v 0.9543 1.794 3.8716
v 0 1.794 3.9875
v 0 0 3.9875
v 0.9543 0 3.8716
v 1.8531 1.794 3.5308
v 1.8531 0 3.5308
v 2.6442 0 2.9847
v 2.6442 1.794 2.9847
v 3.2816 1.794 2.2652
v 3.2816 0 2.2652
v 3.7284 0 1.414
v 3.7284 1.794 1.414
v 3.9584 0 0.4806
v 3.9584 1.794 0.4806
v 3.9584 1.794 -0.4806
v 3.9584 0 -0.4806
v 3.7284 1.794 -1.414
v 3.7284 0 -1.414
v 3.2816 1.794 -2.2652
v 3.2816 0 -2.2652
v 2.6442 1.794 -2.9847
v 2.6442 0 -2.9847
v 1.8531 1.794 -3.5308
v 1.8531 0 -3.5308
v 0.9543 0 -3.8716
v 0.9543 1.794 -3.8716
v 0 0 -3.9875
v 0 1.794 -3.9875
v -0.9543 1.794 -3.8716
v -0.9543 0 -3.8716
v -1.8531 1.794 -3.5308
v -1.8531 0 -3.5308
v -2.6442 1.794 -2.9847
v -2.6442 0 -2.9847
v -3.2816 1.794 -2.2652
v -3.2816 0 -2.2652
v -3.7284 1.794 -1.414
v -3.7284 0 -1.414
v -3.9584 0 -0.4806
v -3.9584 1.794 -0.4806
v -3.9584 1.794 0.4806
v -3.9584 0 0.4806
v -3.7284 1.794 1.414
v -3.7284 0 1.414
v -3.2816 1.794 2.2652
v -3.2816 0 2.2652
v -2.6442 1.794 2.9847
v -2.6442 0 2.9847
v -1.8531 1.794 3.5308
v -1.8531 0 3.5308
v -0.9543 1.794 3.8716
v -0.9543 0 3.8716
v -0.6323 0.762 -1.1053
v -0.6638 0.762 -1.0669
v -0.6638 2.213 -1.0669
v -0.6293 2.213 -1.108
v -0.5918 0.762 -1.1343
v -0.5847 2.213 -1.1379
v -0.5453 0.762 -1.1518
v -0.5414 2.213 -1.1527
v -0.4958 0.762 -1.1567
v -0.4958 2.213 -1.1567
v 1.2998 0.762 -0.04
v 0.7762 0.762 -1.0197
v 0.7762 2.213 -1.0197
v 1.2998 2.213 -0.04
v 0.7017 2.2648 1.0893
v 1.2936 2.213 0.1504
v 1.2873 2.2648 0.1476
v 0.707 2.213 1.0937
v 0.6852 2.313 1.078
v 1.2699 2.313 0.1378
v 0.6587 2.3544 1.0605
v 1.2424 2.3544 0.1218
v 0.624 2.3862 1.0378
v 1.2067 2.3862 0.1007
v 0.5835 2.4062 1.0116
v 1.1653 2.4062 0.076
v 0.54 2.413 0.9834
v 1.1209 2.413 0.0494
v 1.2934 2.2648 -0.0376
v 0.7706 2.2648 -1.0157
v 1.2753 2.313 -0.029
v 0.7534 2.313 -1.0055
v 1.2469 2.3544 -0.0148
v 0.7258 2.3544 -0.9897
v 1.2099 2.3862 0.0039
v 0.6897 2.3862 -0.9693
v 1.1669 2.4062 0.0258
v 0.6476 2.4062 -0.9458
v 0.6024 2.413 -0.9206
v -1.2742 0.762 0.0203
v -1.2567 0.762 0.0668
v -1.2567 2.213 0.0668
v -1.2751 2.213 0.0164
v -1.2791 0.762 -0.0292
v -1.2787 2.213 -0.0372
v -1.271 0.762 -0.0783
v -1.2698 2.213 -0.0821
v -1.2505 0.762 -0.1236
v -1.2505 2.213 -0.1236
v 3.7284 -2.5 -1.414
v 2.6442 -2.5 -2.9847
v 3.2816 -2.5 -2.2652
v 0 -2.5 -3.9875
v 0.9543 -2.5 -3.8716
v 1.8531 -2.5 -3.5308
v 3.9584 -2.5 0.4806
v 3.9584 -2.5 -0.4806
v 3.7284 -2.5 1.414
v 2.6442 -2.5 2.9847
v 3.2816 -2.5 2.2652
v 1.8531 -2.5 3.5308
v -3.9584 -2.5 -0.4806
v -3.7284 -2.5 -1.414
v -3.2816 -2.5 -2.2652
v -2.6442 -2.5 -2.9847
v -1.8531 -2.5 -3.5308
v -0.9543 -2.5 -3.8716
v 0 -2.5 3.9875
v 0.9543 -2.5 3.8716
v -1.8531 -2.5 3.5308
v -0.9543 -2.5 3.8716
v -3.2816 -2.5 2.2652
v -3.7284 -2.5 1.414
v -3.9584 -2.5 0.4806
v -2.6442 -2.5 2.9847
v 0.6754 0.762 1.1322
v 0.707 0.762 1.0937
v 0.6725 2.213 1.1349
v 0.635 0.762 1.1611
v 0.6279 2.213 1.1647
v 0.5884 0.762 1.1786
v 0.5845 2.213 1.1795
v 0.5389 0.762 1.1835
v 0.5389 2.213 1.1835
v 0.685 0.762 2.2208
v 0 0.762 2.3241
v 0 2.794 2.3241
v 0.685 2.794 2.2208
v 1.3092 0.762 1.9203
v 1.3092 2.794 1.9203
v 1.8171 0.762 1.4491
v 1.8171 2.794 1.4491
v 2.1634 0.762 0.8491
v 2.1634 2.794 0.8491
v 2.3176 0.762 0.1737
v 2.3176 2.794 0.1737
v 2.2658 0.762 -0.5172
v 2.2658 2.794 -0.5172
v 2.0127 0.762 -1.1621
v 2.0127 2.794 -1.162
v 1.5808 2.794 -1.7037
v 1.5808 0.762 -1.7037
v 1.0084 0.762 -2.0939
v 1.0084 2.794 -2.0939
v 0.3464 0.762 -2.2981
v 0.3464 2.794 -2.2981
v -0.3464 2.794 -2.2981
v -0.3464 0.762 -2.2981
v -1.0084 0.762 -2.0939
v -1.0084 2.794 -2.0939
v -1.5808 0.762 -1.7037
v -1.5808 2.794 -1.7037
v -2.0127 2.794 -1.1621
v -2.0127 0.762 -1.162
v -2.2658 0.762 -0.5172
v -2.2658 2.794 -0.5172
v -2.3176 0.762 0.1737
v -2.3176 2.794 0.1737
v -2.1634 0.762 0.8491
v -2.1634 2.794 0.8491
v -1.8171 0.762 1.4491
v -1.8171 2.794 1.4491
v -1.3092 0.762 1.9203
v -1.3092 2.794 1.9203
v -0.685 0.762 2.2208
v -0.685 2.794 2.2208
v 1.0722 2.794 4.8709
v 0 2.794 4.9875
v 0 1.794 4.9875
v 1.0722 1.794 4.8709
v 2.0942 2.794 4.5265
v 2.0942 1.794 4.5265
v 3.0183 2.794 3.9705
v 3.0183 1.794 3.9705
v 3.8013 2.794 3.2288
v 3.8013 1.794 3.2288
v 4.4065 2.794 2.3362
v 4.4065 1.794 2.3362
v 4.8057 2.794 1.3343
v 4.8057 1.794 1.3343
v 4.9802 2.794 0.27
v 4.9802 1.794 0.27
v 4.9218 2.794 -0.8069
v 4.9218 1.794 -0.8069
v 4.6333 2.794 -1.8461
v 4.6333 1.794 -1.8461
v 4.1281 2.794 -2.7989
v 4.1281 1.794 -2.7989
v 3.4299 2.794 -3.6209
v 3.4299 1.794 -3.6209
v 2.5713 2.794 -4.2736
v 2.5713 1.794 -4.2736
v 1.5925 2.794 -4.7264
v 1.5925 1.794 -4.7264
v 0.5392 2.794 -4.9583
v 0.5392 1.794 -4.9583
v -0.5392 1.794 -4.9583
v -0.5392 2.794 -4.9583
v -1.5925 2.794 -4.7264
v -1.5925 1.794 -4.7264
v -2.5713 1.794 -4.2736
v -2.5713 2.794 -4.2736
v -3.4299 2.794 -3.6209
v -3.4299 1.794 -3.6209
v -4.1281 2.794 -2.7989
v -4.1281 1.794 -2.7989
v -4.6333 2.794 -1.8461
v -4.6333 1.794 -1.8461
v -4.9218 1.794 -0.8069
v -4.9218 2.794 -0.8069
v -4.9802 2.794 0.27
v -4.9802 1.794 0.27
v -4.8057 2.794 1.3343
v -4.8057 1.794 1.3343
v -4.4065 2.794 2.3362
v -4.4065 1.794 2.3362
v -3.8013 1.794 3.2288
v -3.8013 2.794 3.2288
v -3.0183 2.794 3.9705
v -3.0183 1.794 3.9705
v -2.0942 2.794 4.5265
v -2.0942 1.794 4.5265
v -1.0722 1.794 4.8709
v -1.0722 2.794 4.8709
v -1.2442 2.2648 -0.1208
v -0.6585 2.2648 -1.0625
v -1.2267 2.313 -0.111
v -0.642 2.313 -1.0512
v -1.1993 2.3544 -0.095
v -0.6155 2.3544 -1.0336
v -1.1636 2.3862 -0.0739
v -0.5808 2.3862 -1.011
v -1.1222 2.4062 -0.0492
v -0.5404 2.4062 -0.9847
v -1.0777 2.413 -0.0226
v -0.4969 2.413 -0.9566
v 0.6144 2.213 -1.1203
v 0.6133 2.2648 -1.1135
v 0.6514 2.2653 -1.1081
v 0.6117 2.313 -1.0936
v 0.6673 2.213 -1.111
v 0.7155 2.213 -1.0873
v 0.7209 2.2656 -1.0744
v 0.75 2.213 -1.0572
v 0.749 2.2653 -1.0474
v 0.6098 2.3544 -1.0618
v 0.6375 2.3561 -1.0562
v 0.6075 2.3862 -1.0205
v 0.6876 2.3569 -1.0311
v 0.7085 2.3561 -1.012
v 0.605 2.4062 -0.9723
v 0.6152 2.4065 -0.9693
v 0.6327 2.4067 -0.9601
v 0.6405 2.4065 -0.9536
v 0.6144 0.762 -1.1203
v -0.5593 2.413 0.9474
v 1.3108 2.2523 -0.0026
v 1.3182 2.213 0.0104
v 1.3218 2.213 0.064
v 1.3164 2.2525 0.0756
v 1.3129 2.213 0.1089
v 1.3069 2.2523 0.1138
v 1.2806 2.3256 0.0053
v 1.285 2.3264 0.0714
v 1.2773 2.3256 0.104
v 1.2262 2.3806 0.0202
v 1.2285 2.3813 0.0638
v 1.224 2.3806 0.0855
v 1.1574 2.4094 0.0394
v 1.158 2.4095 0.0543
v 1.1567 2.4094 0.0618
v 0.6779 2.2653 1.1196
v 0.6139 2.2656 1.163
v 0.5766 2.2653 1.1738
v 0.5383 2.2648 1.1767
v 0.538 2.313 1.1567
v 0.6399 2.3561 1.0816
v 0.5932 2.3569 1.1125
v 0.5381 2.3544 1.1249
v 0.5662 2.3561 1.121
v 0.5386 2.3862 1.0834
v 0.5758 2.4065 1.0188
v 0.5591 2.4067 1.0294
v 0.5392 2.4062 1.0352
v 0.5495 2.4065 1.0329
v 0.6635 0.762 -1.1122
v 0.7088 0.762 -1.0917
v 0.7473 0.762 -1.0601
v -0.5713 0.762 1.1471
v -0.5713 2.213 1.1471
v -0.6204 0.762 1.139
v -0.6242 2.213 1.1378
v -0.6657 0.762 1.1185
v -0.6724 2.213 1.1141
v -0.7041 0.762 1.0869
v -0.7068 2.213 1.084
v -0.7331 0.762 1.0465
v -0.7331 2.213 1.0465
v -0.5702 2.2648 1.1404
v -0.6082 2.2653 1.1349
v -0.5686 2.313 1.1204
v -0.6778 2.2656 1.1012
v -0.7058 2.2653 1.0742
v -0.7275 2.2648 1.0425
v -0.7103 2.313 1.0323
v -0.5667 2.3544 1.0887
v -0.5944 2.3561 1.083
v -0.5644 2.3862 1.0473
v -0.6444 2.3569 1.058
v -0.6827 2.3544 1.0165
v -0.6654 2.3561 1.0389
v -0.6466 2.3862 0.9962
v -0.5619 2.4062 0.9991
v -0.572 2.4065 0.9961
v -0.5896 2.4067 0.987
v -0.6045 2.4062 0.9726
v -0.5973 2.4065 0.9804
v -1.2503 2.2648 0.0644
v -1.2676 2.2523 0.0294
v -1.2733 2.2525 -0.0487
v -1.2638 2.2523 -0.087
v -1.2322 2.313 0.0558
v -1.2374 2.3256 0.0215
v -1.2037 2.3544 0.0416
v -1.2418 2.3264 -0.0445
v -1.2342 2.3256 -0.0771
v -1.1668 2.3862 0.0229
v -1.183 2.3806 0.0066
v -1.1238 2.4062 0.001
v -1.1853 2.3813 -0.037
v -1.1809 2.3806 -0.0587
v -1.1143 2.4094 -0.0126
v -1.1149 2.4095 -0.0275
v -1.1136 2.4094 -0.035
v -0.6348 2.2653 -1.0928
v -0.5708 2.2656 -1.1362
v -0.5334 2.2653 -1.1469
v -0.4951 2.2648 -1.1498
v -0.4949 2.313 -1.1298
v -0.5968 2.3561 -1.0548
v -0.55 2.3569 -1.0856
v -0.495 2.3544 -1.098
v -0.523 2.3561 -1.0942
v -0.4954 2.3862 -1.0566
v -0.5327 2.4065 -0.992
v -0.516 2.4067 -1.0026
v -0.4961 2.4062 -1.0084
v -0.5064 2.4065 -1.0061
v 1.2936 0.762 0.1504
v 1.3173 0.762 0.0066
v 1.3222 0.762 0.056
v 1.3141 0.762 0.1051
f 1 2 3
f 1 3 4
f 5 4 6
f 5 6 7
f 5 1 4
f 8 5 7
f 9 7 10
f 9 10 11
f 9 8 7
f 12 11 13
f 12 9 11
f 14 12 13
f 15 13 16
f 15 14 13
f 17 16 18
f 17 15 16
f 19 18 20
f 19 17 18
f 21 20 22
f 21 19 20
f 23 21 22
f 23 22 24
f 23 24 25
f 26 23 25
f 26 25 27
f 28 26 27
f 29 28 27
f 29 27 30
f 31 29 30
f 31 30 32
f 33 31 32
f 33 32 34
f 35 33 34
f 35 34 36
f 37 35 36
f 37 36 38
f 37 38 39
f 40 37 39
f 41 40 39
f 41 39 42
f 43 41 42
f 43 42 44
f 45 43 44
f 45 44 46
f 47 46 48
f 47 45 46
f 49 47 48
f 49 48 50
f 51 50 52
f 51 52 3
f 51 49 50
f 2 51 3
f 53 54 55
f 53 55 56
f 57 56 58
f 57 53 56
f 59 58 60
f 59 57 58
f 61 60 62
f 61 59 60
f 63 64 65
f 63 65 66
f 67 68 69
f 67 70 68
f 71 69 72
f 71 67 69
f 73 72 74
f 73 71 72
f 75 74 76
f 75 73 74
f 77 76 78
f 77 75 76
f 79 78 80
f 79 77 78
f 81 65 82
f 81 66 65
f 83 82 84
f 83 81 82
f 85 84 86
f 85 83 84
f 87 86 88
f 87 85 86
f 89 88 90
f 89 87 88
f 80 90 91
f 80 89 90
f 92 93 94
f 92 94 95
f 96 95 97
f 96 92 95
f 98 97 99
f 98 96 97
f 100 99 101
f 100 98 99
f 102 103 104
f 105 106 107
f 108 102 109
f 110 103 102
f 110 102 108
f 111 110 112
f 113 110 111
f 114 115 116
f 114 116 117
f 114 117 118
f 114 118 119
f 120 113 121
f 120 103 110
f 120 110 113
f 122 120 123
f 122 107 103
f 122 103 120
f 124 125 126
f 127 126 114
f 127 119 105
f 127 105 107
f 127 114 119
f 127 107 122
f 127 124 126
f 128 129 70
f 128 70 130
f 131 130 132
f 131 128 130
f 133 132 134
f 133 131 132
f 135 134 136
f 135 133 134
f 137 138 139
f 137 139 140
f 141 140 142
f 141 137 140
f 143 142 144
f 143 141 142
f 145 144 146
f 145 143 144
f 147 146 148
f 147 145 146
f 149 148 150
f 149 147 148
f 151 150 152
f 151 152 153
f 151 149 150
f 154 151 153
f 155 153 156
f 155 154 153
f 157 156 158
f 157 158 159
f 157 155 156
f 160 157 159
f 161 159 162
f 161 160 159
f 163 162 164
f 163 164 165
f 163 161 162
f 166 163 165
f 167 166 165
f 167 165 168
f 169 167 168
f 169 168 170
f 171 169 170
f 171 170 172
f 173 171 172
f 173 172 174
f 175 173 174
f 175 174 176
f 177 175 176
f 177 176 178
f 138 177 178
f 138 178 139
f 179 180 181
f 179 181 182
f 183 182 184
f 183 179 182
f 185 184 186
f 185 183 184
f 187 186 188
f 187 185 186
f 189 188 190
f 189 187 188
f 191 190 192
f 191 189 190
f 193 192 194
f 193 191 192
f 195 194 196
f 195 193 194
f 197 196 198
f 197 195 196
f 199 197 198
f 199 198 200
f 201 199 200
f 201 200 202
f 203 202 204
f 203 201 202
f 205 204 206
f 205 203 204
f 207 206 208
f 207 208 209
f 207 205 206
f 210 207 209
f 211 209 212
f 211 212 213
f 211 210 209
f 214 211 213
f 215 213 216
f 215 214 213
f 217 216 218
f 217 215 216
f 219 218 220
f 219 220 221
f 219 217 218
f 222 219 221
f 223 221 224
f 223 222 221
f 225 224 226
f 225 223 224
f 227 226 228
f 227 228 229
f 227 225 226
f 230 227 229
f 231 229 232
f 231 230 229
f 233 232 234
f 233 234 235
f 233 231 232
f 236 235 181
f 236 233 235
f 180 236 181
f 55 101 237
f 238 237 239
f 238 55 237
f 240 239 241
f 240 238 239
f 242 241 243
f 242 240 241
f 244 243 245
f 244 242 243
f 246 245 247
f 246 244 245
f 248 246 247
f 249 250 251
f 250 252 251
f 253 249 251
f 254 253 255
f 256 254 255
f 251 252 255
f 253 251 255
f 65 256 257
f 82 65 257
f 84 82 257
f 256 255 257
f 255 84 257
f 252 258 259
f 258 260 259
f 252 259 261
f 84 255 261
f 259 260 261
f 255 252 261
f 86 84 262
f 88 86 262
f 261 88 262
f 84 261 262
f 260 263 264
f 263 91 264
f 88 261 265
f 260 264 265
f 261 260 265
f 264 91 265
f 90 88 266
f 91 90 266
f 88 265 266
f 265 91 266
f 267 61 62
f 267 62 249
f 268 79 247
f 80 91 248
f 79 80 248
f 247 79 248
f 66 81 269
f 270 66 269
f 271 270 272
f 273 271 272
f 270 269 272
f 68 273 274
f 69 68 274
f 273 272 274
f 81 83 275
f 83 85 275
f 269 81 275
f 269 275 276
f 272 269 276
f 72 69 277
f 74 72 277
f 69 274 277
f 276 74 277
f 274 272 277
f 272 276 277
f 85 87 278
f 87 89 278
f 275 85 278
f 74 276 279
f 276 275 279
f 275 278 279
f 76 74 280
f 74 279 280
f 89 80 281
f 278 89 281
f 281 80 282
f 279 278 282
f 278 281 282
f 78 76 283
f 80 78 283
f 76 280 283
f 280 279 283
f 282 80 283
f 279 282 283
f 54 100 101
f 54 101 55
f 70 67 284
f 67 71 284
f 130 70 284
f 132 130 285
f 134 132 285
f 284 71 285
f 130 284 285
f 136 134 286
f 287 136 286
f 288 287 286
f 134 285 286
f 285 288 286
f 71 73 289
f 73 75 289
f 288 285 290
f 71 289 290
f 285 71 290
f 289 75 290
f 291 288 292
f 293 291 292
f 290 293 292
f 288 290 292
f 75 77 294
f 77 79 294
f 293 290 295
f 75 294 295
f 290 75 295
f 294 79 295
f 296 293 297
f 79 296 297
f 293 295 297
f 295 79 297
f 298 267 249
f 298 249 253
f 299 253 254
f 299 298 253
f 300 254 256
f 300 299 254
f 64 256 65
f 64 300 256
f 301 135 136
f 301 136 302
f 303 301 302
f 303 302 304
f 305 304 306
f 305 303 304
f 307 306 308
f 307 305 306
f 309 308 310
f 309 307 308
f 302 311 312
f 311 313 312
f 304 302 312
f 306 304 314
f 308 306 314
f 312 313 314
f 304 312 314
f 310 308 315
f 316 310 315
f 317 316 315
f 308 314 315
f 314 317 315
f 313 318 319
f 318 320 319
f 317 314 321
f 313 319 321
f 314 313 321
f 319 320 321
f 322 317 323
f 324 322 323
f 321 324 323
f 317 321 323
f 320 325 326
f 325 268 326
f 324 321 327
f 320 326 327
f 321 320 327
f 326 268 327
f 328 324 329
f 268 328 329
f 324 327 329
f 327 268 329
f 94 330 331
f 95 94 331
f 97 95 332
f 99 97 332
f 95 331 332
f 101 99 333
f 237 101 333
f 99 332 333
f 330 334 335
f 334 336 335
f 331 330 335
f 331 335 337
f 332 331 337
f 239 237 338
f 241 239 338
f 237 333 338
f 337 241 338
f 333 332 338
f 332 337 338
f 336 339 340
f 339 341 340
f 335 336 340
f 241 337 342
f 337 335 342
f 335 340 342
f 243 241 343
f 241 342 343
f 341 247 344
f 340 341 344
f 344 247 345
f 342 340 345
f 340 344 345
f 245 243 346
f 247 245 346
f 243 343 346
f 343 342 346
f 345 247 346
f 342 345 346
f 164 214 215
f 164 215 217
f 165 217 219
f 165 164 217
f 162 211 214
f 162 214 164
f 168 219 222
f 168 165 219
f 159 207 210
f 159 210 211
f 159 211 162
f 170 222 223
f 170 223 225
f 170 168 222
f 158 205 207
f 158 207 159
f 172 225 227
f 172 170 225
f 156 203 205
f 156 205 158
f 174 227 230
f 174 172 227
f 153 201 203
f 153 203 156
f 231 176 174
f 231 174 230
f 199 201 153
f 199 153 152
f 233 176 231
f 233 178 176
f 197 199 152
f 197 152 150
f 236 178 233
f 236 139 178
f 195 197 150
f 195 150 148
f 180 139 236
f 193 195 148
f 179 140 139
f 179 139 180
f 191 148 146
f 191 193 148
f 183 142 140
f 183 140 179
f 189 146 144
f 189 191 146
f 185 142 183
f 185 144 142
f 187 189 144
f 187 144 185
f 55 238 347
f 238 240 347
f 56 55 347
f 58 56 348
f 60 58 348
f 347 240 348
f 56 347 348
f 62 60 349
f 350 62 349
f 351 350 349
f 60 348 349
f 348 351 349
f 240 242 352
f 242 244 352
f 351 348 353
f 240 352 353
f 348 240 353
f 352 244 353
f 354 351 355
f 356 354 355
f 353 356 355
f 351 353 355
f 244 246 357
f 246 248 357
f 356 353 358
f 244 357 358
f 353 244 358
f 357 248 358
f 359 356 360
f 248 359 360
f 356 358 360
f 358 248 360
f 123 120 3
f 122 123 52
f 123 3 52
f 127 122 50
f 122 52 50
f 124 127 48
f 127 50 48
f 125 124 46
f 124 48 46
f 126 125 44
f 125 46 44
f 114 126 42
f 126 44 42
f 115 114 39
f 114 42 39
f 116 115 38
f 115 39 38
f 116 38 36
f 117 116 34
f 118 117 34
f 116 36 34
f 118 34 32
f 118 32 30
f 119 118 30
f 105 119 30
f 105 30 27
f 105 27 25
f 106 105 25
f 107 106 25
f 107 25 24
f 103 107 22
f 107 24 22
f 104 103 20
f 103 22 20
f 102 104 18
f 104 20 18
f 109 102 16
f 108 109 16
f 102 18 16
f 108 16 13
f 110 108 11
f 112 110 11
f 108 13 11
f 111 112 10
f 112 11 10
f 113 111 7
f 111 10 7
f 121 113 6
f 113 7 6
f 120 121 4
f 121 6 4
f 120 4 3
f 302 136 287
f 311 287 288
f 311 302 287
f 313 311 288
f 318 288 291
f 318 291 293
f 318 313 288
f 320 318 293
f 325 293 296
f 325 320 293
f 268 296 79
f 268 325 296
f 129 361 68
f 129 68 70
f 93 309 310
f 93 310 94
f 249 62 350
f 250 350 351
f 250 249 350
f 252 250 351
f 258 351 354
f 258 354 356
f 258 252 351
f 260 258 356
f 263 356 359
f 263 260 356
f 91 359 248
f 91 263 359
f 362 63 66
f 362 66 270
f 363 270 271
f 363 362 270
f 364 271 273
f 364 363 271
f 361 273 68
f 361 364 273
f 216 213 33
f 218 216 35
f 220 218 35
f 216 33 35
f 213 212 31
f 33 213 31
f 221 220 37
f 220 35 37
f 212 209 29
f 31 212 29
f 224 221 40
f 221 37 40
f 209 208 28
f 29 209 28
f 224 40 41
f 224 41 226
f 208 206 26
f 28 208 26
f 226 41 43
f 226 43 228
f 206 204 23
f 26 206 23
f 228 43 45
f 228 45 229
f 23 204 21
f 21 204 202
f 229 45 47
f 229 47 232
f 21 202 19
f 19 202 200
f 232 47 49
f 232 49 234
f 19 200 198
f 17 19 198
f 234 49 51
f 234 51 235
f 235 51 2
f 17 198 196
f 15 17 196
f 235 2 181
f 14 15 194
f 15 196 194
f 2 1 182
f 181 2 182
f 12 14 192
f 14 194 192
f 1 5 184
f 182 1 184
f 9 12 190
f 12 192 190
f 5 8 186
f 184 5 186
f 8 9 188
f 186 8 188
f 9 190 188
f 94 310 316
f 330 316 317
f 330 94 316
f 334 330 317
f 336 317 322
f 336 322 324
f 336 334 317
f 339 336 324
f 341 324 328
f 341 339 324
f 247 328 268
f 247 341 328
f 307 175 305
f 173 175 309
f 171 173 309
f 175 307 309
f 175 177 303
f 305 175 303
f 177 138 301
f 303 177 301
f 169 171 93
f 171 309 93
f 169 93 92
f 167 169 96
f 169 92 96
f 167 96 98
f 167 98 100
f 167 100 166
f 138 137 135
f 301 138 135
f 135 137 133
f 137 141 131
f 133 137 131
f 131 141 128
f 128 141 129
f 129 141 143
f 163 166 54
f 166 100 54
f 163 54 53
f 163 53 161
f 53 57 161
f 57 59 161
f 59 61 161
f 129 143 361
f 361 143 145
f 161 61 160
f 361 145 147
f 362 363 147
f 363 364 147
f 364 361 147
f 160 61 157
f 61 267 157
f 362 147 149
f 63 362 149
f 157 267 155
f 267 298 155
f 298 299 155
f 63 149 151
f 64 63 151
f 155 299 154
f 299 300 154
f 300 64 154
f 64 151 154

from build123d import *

# Parameters (mm, degrees)
SKETCH1_R           = 6.8961
SKETCH1_R_2         = 2.3241
BOSS_EXTRUDE1_DEPTH = 2.794
SKETCH2_R           = 2.3241
BOSS_EXTRUDE2_DEPTH = 0.762
BOSS_EXTRUDE3_DEPTH = 1.651
SKETCH5_R           = 8.206879239
SKETCH5_R_2         = 3.9875
CUT_EXTRUDE1_DEPTH  = 11.144891642
SKETCH6_R           = 4.9875
SKETCH6_R_2         = 3.9875
BOSS_EXTRUDE4_DEPTH = 1
FILLET1_R           = 0.2
SKETCH7_R           = 3.9875
BOSS_EXTRUDE5_DEPTH = 2.5


with BuildPart() as part:
    # Sketch1 → Boss-Extrude1 (new body)
    with BuildSketch(Plane(origin=(0, 0, 0), x_dir=(1, 0, 0), z_dir=(0, 1, 0))):
        Circle(SKETCH1_R)
        Circle(SKETCH1_R_2, mode=Mode.SUBTRACT)
    extrude(amount=BOSS_EXTRUDE1_DEPTH)

    # Sketch2 → Boss-Extrude2 (add)
    with BuildSketch(Plane.XZ):
        Circle(SKETCH2_R)
    extrude(amount=-BOSS_EXTRUDE2_DEPTH)

    # Sketch3 → Boss-Extrude3 (add)
    with BuildSketch(Plane(origin=(0, 0.762, 0), x_dir=(1, 0, 0), z_dir=(0, 1, 0))):
        with BuildLine():
            Line((-0.495805164, 1.156686678), (0.614449488, 1.120298857))
            ThreePointArc((0.614449488, 1.120298857), (0.708812351, 1.091670316), (0.776218716, 1.01969584))
            Line((0.776218716, 1.01969584), (1.299833265, 0.039993196))
            ThreePointArc((1.299833265, 0.039993196), (1.322221652, -0.056041711), (1.293593111, -0.150404573))
            Line((1.293593111, -0.150404573), (0.706953007, -1.093719397))
            ThreePointArc((0.706953007, -1.093719397), (0.634978532, -1.161125762), (0.538943625, -1.183514149))
            Line((0.538943625, -1.183514149), (-0.571311028, -1.147126328))
            ThreePointArc((-0.571311028, -1.147126328), (-0.66567389, -1.118497787), (-0.733080255, -1.046523312))
            Line((-0.733080255, -1.046523312), (-1.256694804, -0.066820667))
            ThreePointArc((-1.256694804, -0.066820667), (-1.279083191, 0.02921424), (-1.25045465, 0.123577102))
            Line((-1.25045465, 0.123577102), (-0.663814546, 1.066891925))
            ThreePointArc((-0.663814546, 1.066891925), (-0.591840071, 1.134298291), (-0.495805164, 1.156686678))
        make_face()
    extrude(amount=BOSS_EXTRUDE3_DEPTH)

    # Sketch5 → Cut-Extrude1 (cut, through all)
    with BuildSketch(Plane(origin=(0, 2.794, 0), x_dir=(1, 0, 0), z_dir=(0, 1, 0))):
        Circle(SKETCH5_R)
        Circle(SKETCH5_R_2, mode=Mode.SUBTRACT)
    extrude(amount=-CUT_EXTRUDE1_DEPTH, mode=Mode.SUBTRACT)

    # Sketch6 → Boss-Extrude4 (add)
    with BuildSketch(Plane(origin=(0, 2.794, 0), x_dir=(1, 0, 0), z_dir=(0, 1, 0))):
        Circle(SKETCH6_R)
        Circle(SKETCH6_R_2, mode=Mode.SUBTRACT)
    extrude(amount=-BOSS_EXTRUDE4_DEPTH)

    # Fillet1
    fillet1_edges = [part.edges().sort_by_distance(p)[0] for p in [
        (1.038025991, 2.413, -0.529844518),
        (1.322221652, 2.413, 0.056041711),
        (1.000273059, 2.413, 0.622061985),
        (0.634978532, 2.413, 1.161125762),
        (-0.016183701, 2.413, 1.165320239),
        (-0.66567389, 2.413, 1.118497787),
        (-0.99488753, 2.413, 0.556671989),
        (-1.279083191, 2.413, -0.02921424),
        (-0.957134598, 2.413, -0.595234514),
        (-0.591840071, 2.413, -1.134298291),
        (0.059322162, 2.413, -1.138492768),
        (0.708812351, 2.413, -1.091670316),
    ]]
    fillet(fillet1_edges, radius=FILLET1_R)

    # Sketch7 → Boss-Extrude5 (add)
    with BuildSketch(Plane.XZ):
        Circle(SKETCH7_R)
    extrude(amount=BOSS_EXTRUDE5_DEPTH)


solid = part.part
